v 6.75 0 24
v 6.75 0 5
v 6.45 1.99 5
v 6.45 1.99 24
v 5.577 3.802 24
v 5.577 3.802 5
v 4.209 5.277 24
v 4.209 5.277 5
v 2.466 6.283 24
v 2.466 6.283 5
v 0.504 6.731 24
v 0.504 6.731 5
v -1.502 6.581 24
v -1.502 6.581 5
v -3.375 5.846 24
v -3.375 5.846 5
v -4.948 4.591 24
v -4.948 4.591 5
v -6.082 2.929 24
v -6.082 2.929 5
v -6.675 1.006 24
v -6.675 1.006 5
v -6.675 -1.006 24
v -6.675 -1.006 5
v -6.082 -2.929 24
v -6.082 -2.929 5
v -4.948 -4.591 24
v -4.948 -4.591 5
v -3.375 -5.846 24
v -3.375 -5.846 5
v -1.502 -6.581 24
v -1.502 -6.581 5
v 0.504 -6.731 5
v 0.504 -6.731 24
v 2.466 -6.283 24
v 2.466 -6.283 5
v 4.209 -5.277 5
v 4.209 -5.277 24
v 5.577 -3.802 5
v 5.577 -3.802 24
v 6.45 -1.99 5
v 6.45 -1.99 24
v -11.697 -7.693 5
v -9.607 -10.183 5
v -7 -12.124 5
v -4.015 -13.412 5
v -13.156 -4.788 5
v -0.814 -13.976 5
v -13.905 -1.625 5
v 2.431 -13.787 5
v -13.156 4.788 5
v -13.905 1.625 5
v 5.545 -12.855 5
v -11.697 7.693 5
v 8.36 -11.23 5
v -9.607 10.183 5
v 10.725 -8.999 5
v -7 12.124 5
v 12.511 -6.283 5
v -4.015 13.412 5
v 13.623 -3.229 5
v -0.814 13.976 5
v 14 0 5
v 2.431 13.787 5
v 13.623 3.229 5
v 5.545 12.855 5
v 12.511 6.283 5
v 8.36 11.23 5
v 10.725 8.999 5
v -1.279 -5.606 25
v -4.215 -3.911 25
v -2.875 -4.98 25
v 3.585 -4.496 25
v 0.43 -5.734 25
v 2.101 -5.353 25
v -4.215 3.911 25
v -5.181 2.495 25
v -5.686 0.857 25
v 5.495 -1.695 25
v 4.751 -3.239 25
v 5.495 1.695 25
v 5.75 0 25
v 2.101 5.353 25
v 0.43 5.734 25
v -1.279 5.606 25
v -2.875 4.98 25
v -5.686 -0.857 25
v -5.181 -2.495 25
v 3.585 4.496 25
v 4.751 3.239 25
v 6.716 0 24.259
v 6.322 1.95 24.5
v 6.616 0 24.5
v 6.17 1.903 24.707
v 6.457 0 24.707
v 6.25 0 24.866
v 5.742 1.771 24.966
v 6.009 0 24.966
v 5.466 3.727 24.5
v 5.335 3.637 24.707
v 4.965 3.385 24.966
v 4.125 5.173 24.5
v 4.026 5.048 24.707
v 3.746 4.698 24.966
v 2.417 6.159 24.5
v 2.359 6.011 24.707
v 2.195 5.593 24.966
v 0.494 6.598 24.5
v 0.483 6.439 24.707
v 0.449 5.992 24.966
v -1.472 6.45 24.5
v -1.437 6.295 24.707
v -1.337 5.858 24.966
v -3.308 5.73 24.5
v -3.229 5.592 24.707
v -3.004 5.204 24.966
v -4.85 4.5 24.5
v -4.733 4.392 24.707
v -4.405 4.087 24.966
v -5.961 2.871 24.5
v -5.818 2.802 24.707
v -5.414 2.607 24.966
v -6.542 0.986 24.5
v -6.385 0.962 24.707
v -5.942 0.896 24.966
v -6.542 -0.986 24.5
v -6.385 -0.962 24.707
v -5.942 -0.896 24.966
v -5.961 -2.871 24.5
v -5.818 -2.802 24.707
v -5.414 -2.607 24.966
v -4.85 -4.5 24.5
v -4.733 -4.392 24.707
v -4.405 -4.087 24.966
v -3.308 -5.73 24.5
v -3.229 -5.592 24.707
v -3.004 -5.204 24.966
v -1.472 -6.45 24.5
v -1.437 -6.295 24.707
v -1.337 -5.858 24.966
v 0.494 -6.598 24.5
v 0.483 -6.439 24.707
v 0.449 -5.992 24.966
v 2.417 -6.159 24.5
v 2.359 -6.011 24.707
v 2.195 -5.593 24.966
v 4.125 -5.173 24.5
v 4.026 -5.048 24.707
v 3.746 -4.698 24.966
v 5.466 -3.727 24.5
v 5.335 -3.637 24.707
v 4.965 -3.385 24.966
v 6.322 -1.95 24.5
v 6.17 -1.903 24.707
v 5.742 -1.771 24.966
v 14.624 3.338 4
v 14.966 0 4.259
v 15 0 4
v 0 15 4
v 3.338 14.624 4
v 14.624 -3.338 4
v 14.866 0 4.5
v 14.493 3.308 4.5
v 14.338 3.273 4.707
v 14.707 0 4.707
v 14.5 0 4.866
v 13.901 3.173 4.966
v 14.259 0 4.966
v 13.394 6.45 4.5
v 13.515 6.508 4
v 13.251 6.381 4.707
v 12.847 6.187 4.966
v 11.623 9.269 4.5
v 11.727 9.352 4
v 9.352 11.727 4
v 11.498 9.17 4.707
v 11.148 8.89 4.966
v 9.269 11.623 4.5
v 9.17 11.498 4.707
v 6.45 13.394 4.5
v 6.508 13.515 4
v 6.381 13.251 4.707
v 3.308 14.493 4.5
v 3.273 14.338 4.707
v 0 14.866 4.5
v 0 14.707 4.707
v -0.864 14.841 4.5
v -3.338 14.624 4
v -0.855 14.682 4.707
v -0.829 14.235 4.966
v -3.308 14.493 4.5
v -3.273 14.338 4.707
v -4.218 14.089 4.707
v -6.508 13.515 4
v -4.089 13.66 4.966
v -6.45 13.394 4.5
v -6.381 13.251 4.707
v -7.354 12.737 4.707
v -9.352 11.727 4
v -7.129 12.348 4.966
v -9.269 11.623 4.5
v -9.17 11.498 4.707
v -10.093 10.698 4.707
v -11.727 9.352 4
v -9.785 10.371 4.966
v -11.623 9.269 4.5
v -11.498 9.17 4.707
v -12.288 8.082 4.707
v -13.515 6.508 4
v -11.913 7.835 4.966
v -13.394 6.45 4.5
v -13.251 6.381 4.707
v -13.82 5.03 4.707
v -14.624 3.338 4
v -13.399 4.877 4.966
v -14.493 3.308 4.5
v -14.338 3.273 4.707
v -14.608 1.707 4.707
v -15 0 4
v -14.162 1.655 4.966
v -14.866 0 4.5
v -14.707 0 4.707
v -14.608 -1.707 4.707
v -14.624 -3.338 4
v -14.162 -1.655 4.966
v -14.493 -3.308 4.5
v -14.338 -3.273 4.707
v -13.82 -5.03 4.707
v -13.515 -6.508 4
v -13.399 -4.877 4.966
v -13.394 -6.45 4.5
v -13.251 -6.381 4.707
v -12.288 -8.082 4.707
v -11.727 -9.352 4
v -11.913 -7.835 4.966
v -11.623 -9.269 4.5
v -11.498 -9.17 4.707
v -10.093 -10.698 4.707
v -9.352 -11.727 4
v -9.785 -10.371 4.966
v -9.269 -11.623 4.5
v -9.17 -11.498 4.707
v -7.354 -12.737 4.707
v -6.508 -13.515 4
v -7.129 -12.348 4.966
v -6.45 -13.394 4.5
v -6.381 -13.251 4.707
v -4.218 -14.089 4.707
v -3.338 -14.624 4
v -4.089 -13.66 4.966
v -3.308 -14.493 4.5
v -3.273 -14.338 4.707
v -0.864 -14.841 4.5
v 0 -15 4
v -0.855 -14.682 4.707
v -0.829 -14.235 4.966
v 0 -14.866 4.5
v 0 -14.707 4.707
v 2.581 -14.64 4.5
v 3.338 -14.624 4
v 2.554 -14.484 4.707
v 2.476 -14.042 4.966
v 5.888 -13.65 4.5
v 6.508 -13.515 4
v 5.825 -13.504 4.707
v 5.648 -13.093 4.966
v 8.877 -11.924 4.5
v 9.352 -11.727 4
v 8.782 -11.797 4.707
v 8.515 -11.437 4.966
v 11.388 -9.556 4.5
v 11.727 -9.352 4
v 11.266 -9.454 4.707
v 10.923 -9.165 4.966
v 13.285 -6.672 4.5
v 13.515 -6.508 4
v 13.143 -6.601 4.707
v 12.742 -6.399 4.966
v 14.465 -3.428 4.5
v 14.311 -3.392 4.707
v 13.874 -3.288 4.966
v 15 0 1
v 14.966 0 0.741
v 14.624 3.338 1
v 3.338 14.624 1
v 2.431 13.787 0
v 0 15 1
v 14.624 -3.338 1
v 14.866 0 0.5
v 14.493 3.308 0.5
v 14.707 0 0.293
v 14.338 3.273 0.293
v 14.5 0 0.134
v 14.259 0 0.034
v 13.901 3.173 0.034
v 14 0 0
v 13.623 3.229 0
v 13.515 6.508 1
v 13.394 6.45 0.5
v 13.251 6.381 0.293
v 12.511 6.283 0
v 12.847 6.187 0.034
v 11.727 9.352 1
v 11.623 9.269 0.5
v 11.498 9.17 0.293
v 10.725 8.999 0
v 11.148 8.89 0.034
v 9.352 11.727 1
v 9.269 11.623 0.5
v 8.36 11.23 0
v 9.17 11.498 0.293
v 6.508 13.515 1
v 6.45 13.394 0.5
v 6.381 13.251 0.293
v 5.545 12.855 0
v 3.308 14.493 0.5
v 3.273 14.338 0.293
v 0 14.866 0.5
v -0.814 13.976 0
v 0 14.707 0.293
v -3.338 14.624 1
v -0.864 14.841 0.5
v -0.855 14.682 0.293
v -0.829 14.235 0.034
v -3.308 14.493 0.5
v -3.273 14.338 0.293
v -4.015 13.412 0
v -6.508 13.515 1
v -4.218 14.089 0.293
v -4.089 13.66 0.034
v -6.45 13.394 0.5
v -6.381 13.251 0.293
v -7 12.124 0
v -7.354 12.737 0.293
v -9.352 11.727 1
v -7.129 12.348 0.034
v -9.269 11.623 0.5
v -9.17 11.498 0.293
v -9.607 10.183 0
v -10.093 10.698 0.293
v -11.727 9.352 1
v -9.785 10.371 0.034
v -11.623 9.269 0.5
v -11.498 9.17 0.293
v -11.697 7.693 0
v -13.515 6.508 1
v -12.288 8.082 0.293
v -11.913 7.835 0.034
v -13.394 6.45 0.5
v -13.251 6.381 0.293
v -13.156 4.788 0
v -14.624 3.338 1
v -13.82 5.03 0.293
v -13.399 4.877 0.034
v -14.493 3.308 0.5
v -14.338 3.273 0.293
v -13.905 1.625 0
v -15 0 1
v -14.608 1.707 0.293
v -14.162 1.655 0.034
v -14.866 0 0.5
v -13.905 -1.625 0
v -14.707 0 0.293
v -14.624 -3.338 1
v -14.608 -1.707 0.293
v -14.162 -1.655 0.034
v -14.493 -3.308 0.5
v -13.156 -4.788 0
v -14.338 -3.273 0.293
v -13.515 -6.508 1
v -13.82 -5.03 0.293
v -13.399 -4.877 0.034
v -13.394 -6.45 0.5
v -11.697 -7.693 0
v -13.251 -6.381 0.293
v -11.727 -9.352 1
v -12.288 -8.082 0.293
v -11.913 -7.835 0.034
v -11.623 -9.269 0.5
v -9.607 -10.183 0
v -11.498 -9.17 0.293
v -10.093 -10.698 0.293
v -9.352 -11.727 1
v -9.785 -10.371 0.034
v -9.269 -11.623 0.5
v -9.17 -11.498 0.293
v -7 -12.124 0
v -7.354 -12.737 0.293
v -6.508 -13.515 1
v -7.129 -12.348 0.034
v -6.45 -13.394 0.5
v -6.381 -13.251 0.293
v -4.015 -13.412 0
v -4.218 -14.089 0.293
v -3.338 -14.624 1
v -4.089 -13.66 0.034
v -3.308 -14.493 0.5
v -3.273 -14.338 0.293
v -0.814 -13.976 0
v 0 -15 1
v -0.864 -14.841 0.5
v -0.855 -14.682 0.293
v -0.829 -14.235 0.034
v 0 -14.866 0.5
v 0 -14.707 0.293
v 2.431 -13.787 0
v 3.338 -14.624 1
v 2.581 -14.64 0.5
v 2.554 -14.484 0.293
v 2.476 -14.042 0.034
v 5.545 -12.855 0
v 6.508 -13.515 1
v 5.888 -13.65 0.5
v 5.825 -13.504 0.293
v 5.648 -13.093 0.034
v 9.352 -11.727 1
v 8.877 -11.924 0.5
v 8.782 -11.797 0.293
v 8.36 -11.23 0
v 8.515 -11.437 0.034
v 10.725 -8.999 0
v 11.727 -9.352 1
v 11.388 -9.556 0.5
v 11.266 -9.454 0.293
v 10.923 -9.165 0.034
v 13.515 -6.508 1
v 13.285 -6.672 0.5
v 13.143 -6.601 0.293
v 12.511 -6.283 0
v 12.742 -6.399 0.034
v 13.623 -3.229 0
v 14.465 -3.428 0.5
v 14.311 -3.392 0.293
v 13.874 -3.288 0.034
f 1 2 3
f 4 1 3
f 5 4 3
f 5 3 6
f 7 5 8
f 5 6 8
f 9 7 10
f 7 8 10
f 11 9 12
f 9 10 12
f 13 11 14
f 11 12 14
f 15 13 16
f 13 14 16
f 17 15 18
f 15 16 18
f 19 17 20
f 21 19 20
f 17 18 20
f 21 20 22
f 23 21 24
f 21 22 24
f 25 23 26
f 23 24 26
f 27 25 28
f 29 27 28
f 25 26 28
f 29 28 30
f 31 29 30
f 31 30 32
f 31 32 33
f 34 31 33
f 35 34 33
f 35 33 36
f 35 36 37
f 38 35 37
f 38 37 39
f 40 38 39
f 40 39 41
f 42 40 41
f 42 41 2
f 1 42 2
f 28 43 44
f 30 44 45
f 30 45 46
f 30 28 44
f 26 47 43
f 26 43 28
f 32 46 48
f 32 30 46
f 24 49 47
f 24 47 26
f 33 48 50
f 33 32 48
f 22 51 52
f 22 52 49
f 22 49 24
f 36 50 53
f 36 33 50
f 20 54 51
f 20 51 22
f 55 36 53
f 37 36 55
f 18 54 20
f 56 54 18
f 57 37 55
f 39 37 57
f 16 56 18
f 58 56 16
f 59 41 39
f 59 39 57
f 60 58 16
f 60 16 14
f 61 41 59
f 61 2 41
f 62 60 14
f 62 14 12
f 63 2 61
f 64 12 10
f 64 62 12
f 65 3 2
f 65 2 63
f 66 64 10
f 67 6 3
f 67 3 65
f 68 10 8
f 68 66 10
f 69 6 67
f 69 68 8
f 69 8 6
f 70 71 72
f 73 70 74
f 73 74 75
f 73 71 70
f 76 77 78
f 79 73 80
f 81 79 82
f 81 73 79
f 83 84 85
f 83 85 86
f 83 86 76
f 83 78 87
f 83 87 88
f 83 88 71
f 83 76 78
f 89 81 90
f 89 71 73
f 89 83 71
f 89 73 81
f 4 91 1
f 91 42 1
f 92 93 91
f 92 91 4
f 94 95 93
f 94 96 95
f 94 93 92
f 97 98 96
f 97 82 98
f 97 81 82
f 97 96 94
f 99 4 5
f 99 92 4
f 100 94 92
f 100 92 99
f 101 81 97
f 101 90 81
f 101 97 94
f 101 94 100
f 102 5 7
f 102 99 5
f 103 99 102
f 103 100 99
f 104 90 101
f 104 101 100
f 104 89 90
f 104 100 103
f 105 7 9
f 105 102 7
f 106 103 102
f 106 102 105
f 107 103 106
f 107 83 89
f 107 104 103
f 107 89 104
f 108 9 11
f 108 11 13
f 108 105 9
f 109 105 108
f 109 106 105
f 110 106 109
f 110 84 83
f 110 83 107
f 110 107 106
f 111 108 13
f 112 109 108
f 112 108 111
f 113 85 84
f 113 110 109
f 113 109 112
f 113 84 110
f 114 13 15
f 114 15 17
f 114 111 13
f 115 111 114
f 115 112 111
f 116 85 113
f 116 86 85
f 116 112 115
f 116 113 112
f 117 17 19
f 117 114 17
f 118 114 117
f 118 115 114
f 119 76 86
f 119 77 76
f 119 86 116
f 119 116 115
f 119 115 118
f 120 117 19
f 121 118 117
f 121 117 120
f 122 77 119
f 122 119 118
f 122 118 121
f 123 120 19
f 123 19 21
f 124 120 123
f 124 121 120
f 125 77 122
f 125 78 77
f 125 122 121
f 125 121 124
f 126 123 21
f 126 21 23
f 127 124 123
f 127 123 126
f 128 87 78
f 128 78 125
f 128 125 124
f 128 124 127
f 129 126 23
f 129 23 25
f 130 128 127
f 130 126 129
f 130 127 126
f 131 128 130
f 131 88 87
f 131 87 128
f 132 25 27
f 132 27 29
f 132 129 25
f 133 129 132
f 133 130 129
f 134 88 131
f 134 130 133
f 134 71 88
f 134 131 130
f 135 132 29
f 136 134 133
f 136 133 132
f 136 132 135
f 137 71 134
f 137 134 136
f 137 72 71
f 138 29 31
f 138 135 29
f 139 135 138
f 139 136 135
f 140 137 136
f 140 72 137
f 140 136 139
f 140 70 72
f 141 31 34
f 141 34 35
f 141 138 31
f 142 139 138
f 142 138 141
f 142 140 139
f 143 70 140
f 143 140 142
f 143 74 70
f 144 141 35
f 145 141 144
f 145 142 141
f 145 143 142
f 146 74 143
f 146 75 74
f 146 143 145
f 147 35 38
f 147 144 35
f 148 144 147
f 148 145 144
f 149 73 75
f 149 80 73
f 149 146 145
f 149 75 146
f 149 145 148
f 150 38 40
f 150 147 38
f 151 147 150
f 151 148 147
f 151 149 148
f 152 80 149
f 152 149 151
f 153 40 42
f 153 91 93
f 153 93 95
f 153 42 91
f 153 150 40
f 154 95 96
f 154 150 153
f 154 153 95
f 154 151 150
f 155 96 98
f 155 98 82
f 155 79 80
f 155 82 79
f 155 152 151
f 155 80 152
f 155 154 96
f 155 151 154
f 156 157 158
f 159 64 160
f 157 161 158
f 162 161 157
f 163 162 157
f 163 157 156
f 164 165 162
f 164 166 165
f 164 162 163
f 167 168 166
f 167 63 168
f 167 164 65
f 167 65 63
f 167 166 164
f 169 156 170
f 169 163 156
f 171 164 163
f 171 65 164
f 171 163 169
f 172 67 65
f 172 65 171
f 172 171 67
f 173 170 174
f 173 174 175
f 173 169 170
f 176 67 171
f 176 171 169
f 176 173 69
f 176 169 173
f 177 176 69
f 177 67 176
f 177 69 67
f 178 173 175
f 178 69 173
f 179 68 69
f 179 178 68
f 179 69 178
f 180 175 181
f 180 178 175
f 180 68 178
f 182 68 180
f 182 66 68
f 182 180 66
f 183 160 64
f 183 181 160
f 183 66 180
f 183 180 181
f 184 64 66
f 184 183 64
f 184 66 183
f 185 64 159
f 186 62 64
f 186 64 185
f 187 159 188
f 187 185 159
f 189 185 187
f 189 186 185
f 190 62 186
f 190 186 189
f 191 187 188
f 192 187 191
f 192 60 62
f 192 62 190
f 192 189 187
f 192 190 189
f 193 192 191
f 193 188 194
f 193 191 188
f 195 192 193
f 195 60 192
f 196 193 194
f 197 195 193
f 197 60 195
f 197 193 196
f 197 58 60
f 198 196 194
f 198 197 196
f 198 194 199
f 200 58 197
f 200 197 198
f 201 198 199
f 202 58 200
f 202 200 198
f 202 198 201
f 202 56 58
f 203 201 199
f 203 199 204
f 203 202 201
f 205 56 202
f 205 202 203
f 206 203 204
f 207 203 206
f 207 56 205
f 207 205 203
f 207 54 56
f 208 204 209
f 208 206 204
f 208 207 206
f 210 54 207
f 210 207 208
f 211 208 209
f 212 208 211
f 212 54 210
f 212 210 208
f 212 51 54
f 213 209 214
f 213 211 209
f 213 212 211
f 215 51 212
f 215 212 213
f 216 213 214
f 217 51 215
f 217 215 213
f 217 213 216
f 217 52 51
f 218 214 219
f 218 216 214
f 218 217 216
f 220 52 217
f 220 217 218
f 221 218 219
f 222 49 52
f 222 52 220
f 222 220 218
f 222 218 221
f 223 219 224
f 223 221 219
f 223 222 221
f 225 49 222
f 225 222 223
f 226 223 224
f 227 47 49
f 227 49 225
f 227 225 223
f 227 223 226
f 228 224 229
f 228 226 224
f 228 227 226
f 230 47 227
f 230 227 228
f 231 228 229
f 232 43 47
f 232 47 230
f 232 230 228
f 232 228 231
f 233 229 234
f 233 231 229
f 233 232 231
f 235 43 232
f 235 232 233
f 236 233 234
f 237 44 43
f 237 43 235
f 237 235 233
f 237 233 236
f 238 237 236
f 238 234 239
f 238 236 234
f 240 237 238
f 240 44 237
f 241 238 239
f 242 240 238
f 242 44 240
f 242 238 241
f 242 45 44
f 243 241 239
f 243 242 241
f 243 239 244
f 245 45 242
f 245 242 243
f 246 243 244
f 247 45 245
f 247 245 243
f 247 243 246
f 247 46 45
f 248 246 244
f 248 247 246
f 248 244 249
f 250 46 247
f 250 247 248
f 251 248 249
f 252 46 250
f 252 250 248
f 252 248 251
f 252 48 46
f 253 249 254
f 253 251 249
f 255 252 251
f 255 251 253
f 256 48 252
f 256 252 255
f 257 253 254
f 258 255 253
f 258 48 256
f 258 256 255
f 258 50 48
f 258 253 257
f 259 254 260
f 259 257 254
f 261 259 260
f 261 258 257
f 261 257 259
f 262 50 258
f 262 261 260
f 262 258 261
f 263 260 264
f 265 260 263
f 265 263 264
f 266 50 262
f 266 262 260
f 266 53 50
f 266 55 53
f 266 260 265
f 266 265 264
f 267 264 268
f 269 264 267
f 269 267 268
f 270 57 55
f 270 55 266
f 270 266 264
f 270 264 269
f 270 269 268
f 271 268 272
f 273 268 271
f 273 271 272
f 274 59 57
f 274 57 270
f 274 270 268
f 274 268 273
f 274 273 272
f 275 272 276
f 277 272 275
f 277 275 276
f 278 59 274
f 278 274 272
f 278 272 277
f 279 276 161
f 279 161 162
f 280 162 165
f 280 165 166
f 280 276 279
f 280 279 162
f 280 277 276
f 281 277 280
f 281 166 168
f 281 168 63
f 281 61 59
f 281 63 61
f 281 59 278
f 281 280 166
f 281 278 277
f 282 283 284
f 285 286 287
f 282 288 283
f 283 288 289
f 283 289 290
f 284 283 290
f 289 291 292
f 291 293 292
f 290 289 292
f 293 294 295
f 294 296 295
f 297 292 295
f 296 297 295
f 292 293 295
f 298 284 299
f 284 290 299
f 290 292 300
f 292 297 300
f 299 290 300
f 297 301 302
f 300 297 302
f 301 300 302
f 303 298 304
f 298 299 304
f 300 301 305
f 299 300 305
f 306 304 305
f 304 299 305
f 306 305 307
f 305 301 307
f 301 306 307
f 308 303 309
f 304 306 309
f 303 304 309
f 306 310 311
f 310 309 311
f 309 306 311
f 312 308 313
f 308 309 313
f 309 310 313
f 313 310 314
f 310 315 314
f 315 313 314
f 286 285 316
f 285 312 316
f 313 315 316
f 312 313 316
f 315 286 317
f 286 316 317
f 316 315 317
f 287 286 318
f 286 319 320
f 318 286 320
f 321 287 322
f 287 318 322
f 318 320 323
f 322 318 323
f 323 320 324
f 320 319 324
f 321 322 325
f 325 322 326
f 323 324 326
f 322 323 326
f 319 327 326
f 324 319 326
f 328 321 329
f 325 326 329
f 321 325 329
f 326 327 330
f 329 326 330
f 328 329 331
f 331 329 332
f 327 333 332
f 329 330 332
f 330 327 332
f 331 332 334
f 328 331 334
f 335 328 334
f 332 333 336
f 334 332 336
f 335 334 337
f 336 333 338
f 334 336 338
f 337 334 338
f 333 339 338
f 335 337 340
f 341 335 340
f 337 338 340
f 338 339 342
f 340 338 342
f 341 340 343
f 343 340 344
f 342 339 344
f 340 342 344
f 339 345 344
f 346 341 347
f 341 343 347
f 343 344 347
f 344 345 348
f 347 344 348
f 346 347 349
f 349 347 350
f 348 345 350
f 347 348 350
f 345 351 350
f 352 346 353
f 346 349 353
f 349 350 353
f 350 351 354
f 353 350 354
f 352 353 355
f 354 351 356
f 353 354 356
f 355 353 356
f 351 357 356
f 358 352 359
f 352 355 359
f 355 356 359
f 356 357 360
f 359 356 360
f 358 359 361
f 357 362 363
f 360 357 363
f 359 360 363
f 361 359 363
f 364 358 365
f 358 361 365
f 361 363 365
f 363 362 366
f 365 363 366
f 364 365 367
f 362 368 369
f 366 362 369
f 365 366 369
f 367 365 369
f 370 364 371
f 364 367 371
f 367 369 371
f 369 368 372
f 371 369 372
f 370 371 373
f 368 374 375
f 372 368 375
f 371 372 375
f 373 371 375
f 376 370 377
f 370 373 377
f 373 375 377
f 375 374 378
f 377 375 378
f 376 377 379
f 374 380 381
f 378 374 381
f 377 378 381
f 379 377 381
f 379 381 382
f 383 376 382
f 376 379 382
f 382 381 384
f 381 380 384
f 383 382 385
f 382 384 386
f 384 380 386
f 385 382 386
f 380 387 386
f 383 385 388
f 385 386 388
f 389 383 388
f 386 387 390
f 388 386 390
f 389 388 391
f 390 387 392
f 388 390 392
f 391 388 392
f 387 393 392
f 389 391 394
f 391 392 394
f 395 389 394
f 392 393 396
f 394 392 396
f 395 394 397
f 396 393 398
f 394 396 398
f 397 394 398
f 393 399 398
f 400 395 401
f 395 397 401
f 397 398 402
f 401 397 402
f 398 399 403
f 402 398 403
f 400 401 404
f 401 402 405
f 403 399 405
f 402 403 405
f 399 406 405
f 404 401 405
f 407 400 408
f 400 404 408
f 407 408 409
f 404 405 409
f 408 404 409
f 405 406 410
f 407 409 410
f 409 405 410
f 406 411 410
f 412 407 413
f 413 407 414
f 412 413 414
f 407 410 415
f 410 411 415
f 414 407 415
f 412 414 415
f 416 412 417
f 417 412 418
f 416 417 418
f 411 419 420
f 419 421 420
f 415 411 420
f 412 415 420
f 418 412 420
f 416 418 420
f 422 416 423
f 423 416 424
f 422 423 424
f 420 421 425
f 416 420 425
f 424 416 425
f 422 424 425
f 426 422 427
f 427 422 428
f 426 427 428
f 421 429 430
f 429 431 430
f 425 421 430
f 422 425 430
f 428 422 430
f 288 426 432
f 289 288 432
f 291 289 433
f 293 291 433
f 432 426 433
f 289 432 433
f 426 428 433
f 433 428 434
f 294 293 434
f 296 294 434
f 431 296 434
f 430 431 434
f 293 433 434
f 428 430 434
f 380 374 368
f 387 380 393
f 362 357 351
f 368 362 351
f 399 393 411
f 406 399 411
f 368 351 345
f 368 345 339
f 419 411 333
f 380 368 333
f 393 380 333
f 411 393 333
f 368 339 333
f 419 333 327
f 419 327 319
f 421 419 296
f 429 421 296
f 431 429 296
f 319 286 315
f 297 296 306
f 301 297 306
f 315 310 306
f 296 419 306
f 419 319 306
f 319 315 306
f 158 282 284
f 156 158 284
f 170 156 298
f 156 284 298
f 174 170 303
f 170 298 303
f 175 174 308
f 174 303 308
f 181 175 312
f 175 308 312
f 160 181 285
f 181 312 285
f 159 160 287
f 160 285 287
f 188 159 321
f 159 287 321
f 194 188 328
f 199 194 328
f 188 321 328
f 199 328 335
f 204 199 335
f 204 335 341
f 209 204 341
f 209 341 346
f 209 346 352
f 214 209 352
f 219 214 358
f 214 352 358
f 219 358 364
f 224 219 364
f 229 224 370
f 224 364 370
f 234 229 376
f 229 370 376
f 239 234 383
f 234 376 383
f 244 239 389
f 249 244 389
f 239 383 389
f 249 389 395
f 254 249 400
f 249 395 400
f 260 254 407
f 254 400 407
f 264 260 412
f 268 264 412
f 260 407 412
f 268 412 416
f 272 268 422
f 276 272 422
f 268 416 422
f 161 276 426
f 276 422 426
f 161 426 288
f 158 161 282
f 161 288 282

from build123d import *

# Parameters (mm, degrees)
F0_R     = 6.75
F1_DEPTH = 25
F0_R_2   = 15
F2_DEPTH = 5
F3_R     = 1


with BuildPart() as f1:
    # F0 (on Top) → F1 (new body)
    with BuildSketch(Plane.XY):
        Circle(F0_R)
    extrude(amount=F1_DEPTH)

    # F0 (on Top) → F2 (join)
    with BuildSketch(Plane.XY):
        Circle(F0_R_2)
        Circle(F0_R, mode=Mode.SUBTRACT)
    extrude(amount=F2_DEPTH)

    # F3
    f3_edges = [f1.edges().sort_by_distance(p)[0] for p in [
        (-15, 0, 0),
        (-15, 0, 5),
        (-6.75, 0, 25),
    ]]
    fillet(f3_edges, radius=F3_R)


solid = f1.part
